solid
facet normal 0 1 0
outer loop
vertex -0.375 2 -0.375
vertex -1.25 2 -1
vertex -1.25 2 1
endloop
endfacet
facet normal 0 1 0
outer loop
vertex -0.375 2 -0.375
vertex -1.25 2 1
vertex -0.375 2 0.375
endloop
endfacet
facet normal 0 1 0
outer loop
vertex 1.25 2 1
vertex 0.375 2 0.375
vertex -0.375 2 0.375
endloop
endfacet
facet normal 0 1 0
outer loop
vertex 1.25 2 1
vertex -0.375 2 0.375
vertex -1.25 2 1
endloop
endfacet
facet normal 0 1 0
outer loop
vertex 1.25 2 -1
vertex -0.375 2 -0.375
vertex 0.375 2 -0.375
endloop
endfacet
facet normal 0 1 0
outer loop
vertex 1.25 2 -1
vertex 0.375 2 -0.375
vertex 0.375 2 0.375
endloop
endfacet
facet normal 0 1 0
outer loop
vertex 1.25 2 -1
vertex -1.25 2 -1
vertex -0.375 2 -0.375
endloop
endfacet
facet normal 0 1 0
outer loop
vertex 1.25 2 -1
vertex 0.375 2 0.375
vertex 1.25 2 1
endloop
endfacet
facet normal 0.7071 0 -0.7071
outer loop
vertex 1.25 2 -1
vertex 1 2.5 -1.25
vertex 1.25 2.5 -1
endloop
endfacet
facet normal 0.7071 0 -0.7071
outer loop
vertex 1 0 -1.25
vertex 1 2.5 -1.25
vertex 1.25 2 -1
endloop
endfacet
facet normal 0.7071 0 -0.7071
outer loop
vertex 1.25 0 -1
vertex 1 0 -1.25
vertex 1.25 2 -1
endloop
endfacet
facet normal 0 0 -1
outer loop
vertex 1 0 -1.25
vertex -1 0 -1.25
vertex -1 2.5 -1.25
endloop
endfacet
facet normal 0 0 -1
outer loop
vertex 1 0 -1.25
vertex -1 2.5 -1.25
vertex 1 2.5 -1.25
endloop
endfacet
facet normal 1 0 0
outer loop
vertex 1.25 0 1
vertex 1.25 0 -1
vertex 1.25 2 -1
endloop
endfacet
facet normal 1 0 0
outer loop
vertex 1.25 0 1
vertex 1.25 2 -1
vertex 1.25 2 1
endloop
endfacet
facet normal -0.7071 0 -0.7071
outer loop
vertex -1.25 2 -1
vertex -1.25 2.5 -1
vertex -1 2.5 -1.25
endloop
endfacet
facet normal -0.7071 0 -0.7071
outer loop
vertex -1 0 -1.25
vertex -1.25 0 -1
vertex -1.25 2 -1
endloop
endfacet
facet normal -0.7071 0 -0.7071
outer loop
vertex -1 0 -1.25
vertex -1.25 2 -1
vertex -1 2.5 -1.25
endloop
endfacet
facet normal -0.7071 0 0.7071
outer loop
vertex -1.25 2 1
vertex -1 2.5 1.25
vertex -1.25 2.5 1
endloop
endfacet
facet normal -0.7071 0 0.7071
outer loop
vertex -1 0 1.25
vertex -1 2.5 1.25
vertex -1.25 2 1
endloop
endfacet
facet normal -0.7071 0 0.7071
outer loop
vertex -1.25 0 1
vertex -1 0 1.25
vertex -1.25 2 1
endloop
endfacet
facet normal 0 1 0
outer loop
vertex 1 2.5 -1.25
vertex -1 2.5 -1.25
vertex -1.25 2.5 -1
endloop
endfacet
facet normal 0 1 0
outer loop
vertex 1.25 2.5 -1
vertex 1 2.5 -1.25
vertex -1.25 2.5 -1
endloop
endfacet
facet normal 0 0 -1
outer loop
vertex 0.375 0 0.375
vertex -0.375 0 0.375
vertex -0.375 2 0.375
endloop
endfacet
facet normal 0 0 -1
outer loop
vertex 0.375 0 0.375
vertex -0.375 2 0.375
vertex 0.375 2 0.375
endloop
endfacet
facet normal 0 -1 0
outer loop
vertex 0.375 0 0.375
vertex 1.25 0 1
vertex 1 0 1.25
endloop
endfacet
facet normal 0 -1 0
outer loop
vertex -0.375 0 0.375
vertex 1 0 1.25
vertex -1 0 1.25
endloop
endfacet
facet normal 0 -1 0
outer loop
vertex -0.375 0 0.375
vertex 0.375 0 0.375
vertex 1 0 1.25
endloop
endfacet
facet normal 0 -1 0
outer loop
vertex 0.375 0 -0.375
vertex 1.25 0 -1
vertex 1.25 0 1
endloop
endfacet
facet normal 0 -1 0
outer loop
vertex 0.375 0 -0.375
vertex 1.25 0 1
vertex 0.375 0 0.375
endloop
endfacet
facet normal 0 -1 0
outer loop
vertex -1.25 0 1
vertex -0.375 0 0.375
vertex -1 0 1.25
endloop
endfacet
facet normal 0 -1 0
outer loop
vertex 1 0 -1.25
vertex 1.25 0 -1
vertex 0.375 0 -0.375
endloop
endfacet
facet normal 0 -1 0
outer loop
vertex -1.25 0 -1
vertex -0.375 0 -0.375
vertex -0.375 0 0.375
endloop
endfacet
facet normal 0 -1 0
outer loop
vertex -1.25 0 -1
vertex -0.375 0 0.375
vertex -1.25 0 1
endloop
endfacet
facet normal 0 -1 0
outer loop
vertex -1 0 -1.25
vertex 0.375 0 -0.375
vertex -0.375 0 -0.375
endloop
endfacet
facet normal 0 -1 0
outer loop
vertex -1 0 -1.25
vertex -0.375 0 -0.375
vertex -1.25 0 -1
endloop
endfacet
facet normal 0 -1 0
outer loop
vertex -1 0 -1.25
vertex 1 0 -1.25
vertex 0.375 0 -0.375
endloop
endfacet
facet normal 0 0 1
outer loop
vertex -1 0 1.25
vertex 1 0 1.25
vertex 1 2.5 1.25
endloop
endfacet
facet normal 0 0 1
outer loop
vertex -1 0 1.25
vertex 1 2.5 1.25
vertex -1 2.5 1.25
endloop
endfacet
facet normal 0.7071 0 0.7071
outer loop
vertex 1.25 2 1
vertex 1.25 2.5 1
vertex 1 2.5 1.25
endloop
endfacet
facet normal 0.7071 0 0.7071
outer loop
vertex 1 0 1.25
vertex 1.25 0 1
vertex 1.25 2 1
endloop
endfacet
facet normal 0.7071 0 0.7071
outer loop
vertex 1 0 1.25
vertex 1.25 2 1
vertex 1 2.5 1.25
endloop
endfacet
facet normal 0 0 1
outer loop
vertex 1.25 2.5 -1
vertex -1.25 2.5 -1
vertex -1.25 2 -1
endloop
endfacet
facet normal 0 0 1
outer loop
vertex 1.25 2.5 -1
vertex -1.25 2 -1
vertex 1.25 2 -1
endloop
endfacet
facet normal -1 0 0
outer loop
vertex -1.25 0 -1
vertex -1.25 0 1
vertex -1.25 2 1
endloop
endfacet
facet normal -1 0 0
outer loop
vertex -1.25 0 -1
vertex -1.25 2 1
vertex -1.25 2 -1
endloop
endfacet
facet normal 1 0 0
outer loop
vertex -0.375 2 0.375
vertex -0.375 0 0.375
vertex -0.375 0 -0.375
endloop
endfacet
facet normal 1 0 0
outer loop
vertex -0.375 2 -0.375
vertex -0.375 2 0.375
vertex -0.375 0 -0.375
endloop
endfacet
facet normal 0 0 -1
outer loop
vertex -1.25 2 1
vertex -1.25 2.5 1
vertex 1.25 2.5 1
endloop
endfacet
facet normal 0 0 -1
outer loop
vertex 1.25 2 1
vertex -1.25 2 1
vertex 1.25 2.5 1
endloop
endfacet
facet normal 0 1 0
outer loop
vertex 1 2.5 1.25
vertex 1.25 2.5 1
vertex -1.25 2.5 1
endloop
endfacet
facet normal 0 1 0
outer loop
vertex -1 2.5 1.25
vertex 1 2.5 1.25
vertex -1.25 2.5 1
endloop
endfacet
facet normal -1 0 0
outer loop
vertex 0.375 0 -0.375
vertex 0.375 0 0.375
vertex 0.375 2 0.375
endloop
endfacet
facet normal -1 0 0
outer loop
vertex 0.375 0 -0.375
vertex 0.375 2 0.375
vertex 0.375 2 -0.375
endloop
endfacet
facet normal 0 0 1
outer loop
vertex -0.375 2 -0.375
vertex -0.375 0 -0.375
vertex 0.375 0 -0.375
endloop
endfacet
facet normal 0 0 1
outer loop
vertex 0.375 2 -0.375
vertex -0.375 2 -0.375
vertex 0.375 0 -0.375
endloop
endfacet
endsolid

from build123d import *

# Parameters (mm, degrees)
SKETCH1_W           = 0.75
SKETCH1_H           = 0.75
BOSS_EXTRUDE1_DEPTH = 2.5
SKETCH2_W           = 2.5
SKETCH2_H           = 2
CUT_EXTRUDE1_DEPTH  = 0.5


with BuildPart() as part:
    # Sketch1 → Boss-Extrude1 (new body)
    with BuildSketch(Plane(origin=(0, 0, 0), x_dir=(1, 0, 0), z_dir=(0, 1, 0))):
        Polygon((-1.25, 1), (-1, 1.25), (1, 1.25), (1.25, 1), (1.25, -1), (1, -1.25), (-1, -1.25), (-1.25, -1), align=None)
        Rectangle(SKETCH1_W, SKETCH1_H, mode=Mode.SUBTRACT)
    extrude(amount=BOSS_EXTRUDE1_DEPTH)

    # Sketch2 → Cut-Extrude1 (cut)
    with BuildSketch(Plane(origin=(0, 2.5, 0), x_dir=(1, 0, 0), z_dir=(0, 1, 0))):
        Rectangle(SKETCH2_W, SKETCH2_H)
    extrude(amount=-CUT_EXTRUDE1_DEPTH, mode=Mode.SUBTRACT)


solid = part.part
